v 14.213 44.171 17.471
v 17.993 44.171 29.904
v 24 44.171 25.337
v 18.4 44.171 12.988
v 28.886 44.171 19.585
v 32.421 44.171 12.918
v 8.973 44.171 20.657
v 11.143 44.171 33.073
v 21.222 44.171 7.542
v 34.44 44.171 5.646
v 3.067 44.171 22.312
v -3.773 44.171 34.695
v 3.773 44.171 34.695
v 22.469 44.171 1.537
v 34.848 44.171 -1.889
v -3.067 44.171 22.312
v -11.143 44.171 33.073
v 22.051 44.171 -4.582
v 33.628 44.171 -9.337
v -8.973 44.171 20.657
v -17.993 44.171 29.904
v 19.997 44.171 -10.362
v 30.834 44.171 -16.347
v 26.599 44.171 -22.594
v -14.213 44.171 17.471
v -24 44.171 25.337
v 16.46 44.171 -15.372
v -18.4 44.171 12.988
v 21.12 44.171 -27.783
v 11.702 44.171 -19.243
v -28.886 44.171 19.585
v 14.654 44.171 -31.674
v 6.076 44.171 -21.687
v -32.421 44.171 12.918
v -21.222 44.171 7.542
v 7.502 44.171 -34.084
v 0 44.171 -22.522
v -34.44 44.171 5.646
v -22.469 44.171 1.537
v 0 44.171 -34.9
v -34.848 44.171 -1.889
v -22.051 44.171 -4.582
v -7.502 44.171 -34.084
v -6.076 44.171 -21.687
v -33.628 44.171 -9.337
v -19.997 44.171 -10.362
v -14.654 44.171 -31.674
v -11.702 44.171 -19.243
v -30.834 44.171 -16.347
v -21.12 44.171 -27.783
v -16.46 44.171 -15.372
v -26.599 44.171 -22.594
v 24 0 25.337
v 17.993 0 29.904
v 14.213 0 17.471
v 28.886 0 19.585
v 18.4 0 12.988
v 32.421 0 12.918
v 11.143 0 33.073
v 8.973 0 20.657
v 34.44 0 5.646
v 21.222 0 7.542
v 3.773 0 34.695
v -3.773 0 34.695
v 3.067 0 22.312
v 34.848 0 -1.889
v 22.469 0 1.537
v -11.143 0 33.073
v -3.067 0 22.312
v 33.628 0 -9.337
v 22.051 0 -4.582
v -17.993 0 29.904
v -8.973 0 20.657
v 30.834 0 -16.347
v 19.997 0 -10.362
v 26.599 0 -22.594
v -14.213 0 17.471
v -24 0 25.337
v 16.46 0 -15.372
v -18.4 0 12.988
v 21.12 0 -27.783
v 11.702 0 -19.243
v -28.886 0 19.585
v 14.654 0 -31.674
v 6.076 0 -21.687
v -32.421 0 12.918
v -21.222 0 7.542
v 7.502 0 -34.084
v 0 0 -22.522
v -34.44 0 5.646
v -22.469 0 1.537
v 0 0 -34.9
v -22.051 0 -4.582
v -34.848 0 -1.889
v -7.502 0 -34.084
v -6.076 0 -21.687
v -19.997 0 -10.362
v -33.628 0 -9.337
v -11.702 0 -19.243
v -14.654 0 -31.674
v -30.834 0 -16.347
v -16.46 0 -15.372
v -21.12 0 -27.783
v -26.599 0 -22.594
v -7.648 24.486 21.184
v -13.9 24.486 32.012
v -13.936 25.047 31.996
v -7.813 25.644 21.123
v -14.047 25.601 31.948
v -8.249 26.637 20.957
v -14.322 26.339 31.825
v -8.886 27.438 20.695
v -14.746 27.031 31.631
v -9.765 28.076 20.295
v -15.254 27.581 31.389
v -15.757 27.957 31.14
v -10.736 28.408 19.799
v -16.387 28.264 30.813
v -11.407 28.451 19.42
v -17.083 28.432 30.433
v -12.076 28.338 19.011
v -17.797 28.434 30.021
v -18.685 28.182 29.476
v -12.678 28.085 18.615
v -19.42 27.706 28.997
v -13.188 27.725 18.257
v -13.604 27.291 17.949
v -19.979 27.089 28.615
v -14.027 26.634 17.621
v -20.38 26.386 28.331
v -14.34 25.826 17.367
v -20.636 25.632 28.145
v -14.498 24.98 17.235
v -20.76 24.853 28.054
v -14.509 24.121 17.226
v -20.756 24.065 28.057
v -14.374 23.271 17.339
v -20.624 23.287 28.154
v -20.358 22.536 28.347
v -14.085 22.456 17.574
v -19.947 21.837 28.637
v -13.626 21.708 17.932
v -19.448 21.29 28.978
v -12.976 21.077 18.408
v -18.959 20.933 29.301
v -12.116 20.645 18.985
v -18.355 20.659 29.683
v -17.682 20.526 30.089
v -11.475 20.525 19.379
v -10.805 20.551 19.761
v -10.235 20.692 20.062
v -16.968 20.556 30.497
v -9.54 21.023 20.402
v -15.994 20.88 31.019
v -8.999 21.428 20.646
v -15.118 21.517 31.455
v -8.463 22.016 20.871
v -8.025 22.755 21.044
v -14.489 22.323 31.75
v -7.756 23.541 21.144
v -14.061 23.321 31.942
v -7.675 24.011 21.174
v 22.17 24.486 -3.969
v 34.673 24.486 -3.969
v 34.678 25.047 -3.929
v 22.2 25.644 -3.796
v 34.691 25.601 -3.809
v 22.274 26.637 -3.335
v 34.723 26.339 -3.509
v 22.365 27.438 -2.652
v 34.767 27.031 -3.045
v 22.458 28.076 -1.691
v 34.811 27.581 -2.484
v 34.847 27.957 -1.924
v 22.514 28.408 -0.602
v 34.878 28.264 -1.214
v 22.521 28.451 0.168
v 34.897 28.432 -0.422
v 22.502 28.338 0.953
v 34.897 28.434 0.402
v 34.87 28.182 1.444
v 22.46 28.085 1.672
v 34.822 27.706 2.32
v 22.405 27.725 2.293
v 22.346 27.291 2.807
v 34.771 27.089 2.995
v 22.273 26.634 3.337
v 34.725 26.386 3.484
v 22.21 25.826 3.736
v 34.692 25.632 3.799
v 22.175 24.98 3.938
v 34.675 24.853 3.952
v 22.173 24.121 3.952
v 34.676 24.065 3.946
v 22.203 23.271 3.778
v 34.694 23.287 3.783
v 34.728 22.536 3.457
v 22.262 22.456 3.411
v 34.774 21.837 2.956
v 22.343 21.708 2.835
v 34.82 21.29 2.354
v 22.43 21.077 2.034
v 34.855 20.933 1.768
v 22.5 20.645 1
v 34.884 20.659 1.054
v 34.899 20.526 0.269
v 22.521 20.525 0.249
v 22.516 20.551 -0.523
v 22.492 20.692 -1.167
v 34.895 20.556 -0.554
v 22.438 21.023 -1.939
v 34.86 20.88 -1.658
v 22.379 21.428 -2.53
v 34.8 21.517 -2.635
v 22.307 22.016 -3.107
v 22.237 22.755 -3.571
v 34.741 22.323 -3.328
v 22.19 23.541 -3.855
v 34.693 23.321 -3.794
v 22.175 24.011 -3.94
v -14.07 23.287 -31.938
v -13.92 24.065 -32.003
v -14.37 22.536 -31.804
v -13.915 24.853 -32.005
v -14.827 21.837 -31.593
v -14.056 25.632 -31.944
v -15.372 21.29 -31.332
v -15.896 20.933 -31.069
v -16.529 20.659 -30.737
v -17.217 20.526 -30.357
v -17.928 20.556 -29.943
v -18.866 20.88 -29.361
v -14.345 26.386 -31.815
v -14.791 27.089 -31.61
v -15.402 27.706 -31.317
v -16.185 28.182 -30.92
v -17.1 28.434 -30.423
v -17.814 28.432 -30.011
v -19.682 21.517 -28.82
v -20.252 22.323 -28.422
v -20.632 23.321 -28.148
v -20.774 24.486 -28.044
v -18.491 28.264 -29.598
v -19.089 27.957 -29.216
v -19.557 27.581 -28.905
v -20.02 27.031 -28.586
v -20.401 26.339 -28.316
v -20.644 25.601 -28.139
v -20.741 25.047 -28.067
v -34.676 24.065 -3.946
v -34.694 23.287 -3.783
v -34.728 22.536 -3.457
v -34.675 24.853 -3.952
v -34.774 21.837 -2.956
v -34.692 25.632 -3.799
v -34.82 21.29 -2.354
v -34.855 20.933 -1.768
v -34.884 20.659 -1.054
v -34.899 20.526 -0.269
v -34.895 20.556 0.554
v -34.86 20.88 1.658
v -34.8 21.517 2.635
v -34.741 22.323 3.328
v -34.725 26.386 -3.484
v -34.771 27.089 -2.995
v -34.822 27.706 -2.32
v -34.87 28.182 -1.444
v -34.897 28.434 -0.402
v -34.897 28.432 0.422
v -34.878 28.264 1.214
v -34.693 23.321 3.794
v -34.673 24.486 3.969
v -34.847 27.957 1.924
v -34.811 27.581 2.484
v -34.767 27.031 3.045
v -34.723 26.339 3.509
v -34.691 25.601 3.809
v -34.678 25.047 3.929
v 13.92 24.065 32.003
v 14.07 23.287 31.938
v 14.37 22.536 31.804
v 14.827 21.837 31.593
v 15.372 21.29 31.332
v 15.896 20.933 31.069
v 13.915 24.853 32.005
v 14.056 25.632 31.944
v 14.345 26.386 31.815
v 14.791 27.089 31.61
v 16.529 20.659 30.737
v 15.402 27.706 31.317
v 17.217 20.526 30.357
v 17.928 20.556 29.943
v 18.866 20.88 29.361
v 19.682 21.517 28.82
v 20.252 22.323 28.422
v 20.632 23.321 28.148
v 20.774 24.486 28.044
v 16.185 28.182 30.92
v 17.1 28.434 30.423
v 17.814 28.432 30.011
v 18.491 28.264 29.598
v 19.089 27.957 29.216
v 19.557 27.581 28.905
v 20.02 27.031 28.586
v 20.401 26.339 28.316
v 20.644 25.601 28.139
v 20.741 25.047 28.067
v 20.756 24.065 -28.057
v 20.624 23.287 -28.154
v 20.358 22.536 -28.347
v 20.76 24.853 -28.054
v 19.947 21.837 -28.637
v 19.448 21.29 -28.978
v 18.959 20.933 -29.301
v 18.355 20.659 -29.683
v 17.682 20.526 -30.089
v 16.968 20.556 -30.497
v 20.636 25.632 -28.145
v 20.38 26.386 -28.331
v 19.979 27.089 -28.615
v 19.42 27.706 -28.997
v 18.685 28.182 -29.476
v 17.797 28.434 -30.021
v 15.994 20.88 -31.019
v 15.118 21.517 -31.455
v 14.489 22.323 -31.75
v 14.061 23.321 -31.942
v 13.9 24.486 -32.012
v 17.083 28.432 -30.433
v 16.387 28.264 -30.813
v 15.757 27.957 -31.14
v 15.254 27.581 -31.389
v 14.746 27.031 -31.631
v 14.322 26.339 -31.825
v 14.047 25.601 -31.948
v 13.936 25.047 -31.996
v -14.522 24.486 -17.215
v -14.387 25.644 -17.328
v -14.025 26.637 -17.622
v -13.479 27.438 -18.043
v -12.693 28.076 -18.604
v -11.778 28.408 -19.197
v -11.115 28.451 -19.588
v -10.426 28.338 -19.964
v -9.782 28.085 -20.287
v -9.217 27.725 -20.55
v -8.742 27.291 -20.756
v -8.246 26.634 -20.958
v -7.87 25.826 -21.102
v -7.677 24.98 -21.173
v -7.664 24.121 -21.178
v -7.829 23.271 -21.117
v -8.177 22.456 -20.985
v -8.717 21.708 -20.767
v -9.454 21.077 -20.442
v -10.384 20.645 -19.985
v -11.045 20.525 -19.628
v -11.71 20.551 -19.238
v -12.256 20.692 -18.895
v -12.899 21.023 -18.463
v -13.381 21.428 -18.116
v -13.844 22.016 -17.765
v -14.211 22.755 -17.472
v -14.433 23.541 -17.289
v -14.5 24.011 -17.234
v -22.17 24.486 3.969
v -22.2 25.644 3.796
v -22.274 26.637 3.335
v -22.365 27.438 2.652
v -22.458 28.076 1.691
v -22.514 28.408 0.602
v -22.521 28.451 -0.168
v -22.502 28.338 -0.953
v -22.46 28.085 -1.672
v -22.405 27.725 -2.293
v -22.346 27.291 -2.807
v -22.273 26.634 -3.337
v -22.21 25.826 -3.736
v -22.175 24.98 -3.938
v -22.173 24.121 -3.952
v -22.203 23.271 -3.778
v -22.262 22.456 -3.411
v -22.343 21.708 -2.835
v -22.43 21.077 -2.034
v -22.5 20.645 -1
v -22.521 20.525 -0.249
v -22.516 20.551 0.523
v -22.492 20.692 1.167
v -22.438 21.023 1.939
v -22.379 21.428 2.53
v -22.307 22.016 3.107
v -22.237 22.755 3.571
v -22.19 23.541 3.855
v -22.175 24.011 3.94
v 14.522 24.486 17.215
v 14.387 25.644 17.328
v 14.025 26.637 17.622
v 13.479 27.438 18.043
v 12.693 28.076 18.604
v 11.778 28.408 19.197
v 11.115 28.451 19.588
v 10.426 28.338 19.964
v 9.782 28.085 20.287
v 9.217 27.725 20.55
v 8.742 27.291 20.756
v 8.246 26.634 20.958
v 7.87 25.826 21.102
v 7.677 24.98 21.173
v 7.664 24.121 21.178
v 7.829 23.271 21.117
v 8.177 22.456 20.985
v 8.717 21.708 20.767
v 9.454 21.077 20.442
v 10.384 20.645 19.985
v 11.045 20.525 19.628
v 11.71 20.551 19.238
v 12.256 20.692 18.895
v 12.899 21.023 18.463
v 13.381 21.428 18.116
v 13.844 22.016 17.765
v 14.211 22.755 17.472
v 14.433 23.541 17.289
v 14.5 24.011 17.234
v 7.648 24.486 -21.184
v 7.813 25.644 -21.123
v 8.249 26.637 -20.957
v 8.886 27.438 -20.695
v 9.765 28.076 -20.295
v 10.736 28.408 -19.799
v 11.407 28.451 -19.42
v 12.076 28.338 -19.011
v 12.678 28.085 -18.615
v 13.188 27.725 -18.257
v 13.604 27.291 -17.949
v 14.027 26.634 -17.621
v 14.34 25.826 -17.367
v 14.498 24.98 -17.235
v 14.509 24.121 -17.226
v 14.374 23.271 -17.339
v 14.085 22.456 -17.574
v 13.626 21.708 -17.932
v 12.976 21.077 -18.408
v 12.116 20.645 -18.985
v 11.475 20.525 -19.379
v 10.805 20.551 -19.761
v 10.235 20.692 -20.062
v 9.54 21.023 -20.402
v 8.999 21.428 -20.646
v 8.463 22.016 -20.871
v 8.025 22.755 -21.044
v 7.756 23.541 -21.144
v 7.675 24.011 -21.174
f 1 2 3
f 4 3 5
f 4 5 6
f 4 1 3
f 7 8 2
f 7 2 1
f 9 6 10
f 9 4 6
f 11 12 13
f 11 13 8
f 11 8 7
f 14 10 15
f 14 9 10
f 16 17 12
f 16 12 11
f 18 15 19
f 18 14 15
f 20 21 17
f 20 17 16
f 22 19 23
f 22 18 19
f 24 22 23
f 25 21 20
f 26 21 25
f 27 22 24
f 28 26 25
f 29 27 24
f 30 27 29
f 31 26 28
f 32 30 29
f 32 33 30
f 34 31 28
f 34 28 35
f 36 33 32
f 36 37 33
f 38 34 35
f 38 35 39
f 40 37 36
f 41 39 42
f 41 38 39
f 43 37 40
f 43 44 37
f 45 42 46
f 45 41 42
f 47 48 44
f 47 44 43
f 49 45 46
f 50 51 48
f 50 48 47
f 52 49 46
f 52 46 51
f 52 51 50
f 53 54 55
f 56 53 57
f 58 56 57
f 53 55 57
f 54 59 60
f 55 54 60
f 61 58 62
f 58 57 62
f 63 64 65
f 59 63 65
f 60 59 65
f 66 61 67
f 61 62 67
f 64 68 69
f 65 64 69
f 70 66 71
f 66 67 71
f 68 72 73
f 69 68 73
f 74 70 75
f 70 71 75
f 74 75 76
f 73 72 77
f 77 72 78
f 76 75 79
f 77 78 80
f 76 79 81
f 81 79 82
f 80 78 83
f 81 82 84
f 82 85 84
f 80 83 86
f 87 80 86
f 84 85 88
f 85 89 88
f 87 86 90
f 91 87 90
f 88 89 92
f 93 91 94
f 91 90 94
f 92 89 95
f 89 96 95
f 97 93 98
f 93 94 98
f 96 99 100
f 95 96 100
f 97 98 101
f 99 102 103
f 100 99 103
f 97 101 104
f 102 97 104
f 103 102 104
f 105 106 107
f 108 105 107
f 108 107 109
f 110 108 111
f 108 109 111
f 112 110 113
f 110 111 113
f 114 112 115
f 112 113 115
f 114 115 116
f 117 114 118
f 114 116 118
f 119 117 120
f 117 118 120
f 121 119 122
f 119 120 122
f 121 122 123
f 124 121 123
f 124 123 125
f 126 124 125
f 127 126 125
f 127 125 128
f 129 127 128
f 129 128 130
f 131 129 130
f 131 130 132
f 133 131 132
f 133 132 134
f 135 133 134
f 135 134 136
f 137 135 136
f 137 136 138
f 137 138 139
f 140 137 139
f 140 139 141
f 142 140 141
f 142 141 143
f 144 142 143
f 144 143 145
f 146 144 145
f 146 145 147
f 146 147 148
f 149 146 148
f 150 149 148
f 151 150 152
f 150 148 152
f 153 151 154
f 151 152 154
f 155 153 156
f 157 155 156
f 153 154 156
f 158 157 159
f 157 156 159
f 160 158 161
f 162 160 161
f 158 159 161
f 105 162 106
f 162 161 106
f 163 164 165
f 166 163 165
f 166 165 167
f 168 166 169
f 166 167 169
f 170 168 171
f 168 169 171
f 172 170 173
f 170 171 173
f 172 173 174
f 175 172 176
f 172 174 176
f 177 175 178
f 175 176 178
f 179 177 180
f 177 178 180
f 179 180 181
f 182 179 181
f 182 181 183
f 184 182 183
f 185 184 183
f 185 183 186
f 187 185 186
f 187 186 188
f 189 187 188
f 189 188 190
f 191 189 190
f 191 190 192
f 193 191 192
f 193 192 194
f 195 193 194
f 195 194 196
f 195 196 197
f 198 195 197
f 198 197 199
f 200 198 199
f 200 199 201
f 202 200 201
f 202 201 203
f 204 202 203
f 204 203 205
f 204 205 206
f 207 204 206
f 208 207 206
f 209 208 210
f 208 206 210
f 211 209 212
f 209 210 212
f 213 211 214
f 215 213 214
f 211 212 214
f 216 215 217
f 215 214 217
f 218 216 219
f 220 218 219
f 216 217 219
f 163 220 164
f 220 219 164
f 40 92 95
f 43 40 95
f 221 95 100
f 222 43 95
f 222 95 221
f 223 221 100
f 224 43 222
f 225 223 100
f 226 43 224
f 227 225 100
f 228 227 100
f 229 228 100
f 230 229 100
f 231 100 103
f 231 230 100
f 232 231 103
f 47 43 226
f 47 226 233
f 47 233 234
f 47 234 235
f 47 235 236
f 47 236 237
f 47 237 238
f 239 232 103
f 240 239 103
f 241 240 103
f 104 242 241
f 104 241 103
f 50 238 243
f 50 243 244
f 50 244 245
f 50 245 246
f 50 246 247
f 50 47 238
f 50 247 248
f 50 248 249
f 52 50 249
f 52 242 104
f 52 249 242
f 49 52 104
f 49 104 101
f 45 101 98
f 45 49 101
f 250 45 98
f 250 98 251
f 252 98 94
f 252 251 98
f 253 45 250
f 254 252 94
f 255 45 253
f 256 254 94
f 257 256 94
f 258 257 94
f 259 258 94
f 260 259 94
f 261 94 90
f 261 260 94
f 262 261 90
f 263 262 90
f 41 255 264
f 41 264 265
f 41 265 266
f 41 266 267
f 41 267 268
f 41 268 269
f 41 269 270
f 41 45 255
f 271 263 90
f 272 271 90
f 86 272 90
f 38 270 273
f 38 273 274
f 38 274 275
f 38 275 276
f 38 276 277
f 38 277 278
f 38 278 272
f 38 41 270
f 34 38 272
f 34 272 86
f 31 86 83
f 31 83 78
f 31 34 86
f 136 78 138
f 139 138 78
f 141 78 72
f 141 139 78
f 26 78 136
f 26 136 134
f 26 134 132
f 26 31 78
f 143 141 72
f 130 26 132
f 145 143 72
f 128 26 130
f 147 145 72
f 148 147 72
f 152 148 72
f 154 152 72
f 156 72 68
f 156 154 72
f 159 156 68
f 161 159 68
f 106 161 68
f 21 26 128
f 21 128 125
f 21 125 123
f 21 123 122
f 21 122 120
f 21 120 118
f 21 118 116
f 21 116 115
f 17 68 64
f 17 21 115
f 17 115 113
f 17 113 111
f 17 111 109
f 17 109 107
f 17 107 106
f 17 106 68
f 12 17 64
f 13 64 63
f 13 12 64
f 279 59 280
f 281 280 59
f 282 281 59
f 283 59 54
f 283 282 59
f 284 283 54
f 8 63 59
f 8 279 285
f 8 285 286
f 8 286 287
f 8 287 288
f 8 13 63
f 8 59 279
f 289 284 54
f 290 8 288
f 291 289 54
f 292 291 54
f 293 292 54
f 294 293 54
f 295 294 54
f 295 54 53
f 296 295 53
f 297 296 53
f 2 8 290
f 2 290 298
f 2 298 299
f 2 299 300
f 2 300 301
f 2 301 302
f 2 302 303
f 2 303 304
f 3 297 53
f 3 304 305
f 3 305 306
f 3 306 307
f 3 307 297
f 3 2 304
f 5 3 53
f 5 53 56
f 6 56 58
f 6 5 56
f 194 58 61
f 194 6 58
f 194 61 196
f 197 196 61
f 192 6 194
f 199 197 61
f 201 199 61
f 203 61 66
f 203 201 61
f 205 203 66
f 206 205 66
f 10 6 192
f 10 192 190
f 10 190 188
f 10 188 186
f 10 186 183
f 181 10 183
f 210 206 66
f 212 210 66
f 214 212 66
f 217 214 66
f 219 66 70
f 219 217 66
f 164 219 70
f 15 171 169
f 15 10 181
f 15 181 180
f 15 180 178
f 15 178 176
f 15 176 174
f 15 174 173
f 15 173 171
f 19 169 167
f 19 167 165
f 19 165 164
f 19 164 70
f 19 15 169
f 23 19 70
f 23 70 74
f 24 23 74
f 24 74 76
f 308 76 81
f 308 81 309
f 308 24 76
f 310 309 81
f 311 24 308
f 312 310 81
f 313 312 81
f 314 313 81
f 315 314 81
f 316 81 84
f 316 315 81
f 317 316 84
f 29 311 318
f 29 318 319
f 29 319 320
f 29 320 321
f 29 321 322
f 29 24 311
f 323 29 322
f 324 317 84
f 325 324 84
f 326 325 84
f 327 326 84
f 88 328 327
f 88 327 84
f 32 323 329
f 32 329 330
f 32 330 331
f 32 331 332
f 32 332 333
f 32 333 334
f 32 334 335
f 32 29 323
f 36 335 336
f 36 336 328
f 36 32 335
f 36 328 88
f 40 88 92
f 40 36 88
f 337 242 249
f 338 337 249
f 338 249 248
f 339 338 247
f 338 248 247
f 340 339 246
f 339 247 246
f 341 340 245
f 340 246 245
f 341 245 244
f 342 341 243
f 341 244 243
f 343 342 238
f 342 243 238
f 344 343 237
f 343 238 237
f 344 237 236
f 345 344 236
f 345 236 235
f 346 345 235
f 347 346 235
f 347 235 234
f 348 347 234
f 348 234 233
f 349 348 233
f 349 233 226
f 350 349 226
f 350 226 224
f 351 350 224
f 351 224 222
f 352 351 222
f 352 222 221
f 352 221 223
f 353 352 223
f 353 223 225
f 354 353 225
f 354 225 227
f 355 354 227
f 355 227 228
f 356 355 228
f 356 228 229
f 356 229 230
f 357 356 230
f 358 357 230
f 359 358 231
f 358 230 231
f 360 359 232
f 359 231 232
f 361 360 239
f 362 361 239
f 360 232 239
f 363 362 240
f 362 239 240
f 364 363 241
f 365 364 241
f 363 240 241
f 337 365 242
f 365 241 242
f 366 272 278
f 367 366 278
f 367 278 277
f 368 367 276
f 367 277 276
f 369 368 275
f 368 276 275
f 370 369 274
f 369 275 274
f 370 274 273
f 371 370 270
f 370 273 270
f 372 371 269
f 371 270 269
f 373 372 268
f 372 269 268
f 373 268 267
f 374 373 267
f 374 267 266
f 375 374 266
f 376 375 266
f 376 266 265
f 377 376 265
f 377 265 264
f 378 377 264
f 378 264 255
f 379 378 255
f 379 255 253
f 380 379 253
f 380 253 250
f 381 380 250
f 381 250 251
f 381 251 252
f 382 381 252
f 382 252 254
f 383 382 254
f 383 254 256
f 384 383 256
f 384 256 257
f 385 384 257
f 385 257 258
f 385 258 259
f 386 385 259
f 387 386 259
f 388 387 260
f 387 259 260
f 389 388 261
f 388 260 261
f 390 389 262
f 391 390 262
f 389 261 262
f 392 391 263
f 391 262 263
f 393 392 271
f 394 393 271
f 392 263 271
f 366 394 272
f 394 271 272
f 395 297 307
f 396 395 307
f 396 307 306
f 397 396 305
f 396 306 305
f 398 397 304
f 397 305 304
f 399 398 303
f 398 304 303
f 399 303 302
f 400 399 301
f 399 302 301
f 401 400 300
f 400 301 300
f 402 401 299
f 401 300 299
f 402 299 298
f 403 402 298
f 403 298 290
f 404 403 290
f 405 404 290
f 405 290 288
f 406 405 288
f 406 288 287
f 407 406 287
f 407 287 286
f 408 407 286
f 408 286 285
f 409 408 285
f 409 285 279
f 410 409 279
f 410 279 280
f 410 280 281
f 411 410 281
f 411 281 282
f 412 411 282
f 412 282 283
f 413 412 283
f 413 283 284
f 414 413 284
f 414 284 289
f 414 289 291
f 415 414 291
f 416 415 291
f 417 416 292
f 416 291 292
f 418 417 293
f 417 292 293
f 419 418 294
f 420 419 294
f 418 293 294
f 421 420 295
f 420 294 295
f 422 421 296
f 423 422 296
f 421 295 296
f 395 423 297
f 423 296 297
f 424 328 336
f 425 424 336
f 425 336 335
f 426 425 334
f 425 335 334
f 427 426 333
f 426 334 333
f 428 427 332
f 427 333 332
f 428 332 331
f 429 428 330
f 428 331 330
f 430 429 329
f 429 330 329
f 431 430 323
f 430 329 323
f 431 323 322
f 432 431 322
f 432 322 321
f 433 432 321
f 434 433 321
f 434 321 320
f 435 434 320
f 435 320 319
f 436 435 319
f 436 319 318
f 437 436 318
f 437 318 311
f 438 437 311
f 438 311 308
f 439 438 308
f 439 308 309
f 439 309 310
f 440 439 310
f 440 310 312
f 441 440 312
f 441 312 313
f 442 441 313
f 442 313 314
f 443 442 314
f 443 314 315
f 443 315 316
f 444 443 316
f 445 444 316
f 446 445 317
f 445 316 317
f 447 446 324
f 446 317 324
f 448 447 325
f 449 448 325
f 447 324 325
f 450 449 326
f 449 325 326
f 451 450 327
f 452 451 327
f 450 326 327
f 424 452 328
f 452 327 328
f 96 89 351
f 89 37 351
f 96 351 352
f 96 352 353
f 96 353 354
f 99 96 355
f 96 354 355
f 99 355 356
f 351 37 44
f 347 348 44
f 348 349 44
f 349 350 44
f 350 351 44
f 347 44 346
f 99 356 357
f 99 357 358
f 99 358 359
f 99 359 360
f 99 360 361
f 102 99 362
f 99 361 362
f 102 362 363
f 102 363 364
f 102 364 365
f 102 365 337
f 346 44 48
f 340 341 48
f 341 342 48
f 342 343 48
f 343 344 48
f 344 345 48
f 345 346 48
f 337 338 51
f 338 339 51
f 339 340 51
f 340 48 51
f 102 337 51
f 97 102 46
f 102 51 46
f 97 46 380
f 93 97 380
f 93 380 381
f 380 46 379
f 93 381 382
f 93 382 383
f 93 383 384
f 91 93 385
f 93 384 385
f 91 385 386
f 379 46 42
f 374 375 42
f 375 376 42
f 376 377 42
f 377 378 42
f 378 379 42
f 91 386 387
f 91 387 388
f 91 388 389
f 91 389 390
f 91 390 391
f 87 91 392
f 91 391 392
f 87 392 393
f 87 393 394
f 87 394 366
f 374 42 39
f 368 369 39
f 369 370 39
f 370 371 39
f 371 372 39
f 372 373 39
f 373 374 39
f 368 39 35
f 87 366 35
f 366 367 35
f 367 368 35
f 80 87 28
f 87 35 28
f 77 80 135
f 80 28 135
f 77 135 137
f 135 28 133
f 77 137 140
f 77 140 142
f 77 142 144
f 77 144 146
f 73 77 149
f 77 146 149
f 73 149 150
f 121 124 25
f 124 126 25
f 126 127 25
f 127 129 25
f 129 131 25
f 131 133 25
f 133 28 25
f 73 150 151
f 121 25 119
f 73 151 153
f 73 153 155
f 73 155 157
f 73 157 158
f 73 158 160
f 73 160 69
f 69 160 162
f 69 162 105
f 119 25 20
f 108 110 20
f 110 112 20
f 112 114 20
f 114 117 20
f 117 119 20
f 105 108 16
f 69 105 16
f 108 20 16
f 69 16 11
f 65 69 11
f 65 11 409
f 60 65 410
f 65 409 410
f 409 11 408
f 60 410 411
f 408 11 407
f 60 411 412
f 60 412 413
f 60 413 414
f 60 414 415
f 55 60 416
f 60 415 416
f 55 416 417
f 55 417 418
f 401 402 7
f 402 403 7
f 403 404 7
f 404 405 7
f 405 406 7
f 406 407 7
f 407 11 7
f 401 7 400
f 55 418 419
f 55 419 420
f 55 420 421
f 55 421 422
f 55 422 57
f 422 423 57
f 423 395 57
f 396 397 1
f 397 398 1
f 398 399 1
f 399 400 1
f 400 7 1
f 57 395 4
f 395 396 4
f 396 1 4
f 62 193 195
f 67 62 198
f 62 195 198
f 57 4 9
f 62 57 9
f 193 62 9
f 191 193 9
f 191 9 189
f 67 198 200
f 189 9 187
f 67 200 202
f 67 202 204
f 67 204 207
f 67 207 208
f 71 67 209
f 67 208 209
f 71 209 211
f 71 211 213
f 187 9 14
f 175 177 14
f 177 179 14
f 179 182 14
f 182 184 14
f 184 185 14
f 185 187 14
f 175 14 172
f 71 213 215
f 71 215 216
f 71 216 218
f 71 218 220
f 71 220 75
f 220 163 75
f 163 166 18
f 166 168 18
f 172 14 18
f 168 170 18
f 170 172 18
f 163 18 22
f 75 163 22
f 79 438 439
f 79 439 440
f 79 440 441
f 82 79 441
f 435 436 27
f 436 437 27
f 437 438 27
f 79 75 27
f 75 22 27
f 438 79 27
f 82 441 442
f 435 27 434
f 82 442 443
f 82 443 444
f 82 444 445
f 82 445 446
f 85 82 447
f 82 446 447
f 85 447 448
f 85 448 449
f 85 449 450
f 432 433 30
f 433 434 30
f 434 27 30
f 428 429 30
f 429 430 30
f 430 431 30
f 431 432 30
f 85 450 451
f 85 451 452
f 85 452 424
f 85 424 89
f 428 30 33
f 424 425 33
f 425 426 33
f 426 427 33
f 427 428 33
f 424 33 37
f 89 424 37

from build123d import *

# Parameters (mm, degrees)
SKETCH2_W                    = 12.3776613
SKETCH2_H                    = 44.1706
F_3_8_16_TAPPED_HOLE2_REACH  = 91.671
F_3_8_16_TAPPED_HOLE2_BORE_R = 3.96875
CIRPATTERN1_COUNT            = 6


with BuildPart() as part:
    # Sketch2 → Revolve1 (revolve)
    with BuildSketch(Plane.XY, mode=Mode.PRIVATE) as revolve1_sk:
        with Locations((-28.71076935, 22.0853)):
            Rectangle(SKETCH2_W, SKETCH2_H)
    revolve(revolve1_sk.sketch.rotate(Axis((0, 0, 0), (0, 1, 0)), 270), axis=Axis((0, 0, 0), (0, 1, 0)))

    # 3/8-16 Tapped Hole2 bore → 3/8-16 Tapped Hole2 (cut, up to next)
    with BuildSketch(Plane(origin=(34.8996, 0, 0), x_dir=(0, 0, -1), z_dir=(1, 0, 0)), mode=Mode.PRIVATE) as f_3_8_16_tapped_hole2_sk1:
        with Locations((0, 24.4856)):
            Circle(F_3_8_16_TAPPED_HOLE2_BORE_R)
    f_3_8_16_tapped_hole2_tool1 = extrude(f_3_8_16_tapped_hole2_sk1.sketch, amount=-F_3_8_16_TAPPED_HOLE2_REACH, mode=Mode.PRIVATE) & part.part
    f_3_8_16_tapped_hole2 = f_3_8_16_tapped_hole2_tool1.solids().sort_by_distance((34.8996, 24.4856, 0))[0]
    add(f_3_8_16_tapped_hole2, mode=Mode.SUBTRACT)

    # CirPattern1: 3/8-16 Tapped Hole2 ×6 about axis
    cirpattern1_axis = Axis((0, 44.1706, 0), (0, -1, 0))
    for i in range(1, CIRPATTERN1_COUNT):
        add(f_3_8_16_tapped_hole2.rotate(cirpattern1_axis, i * 360 / CIRPATTERN1_COUNT), mode=Mode.SUBTRACT)


solid = part.part
